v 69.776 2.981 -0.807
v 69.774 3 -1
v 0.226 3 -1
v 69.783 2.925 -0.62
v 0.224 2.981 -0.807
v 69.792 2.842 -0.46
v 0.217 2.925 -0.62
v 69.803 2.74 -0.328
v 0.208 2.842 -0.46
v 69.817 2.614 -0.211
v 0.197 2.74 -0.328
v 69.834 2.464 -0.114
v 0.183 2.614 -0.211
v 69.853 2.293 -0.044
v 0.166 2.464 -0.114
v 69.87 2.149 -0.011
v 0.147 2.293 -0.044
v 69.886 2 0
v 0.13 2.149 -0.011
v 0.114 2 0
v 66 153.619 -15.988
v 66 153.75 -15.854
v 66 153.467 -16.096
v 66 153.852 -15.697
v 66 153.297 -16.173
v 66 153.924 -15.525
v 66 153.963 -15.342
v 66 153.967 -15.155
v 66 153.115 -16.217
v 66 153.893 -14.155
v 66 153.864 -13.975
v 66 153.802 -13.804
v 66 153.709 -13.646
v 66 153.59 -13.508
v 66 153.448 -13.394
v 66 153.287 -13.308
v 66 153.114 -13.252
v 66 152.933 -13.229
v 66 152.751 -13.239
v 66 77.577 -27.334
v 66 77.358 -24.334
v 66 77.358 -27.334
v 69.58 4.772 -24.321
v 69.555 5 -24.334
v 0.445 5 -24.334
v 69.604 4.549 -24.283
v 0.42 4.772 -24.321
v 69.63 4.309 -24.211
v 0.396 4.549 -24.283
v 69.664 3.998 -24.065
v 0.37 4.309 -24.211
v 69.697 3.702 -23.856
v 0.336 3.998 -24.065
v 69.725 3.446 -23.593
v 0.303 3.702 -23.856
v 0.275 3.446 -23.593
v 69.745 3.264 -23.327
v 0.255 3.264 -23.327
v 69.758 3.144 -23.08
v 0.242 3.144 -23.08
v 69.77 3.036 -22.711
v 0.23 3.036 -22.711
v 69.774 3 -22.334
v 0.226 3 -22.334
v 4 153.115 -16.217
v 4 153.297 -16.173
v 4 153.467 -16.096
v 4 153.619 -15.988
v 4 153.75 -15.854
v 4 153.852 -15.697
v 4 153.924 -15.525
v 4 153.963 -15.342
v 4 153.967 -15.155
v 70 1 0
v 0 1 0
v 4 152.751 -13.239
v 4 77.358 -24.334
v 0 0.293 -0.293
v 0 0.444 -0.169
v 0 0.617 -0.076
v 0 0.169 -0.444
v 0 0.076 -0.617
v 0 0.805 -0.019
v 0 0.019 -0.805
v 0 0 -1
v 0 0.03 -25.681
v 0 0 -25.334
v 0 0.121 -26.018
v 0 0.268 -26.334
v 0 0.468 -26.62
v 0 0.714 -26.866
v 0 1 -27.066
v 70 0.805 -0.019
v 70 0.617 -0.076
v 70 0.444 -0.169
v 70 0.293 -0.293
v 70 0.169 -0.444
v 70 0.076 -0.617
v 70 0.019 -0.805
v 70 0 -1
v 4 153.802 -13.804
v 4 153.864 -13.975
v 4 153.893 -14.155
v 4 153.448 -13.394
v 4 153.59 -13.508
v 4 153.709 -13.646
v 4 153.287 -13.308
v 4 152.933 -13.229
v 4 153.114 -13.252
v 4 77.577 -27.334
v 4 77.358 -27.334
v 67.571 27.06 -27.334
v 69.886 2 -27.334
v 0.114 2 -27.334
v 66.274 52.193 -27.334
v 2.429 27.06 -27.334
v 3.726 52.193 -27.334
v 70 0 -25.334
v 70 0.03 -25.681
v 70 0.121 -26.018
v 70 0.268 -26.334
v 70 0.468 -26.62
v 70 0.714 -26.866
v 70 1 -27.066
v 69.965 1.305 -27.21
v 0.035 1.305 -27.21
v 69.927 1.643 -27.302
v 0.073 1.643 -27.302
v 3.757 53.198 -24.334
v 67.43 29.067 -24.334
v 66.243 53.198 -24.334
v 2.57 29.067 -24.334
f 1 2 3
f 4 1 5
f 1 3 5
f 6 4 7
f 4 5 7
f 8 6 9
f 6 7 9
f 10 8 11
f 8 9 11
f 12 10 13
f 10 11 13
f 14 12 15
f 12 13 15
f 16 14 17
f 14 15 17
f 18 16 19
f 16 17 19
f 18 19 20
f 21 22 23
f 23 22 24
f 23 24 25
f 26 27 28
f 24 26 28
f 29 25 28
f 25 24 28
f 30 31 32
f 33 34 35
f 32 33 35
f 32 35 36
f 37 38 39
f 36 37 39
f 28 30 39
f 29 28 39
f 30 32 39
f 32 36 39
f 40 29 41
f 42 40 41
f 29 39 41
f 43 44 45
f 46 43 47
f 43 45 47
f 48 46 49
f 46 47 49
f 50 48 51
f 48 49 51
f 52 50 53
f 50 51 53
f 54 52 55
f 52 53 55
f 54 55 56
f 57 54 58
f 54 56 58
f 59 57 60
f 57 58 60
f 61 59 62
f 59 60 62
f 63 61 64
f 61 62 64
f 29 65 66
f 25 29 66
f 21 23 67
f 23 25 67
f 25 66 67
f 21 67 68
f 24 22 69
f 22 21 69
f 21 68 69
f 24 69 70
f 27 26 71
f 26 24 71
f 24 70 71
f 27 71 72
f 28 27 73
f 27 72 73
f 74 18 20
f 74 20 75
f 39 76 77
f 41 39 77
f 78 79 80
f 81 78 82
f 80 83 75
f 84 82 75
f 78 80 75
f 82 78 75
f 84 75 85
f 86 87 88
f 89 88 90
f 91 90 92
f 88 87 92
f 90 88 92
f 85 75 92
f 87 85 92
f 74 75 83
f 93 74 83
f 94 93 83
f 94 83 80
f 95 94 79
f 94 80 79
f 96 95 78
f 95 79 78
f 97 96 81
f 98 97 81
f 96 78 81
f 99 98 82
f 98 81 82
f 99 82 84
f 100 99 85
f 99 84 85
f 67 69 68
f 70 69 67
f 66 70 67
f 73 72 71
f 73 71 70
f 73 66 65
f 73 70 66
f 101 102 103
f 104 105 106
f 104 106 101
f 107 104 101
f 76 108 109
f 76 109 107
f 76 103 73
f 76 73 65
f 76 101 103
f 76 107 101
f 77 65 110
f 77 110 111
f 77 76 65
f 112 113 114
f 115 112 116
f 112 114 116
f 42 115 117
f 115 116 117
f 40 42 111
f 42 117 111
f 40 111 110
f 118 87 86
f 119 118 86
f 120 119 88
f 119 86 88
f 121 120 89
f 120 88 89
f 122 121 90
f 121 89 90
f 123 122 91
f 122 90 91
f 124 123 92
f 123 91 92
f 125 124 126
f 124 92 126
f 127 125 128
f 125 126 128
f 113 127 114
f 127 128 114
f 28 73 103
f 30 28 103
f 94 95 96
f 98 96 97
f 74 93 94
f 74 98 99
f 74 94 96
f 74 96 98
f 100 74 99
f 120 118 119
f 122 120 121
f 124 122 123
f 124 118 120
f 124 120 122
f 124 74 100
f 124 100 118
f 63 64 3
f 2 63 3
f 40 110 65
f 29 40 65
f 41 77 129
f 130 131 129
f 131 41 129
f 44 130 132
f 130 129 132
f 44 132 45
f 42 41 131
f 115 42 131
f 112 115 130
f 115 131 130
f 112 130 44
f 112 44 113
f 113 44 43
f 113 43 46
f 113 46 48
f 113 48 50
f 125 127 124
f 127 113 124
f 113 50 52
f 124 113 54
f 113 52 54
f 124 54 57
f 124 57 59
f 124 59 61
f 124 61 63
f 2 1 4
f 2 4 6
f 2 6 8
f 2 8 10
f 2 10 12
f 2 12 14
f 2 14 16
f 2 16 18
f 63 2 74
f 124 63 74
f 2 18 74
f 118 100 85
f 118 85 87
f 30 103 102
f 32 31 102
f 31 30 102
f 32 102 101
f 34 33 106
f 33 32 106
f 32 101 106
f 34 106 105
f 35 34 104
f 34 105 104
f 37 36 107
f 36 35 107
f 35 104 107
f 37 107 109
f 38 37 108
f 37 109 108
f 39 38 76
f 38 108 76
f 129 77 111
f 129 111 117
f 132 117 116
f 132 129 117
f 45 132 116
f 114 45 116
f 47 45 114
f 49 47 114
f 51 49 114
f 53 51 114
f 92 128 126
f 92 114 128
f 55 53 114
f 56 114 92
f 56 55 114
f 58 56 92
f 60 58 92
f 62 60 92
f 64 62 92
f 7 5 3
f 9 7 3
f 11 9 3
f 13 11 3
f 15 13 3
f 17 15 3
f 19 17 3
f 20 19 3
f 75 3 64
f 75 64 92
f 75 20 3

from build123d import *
from OCP.BRepAlgoAPI import BRepAlgoAPI_Cut
from OCP.TopTools import TopTools_ListOfShape

# Parameters (mm, degrees)
BOSS_EXTRUDE1_DEPTH = 70
CUT_EXTRUDE4_DEPTH  = 70


with BuildPart() as part:
    # Sketch1 → Boss-Extrude1 (new body)
    with BuildSketch(Plane(origin=(0, 0, 0), x_dir=(0, 0, -1), z_dir=(1, 0, 0))):
        with BuildLine():
            Line((1, 0), (25.334184189, 0))
            ThreePointArc((25.334184189, 0), (26.748397751, 0.585786438), (27.334184189, 2))
            Line((27.334184189, 2), (27.334184189, 77.577100538))
            Line((27.334184189, 77.577100538), (16.217438852, 153.114908847))
            ThreePointArc((16.217438852, 153.114908847), (15.853623852, 153.749510415), (15.155100701, 153.966641506))
            Line((15.155100701, 153.966641506), (14.155100701, 153.893451695))
            ThreePointArc((14.155100701, 153.893451695), (13.447894018, 153.521647944), (13.238751678, 152.750519677))
            Line((13.238751678, 152.750519677), (24.334184189, 77.357531107))
            Line((24.334184189, 77.357531107), (24.334184189, 5))
            ThreePointArc((24.334184189, 5), (23.748397751, 3.585786438), (22.334184189, 3))
            Line((22.334184189, 3), (1, 3))
            ThreePointArc((1, 3), (0.292893219, 2.707106781), (0, 2))
            Line((0, 2), (0, 1))
            ThreePointArc((0, 1), (0.292893219, 0.292893219), (1, 0))
        make_face()
    extrude(amount=BOSS_EXTRUDE1_DEPTH)


with BuildPart() as cut_extrude4_tool:
    # Sketch2 → Cut-Extrude4 (new body)
    with BuildSketch(Plane.XY):
        with BuildLine():
            Line((0, 1), (0, 154.250011553))
            Line((0, 154.250011553), (4, 154.250011553))
            Line((4, 154.250011553), (4, 77.357531107))
            add(Edge.make_bspline(
                [(4, 77.357531107), (4.361118304, 39.105803732), (0, 1)],
                knots=[0, 0, 0, 1, 1, 1], degree=2))
        make_face()
        with BuildLine():
            Line((70, 154.250011553), (66, 154.250011553))
            Line((66, 154.250011553), (66, 77.357531107))
            add(Edge.make_bspline(
                [(66, 77.357531107), (65.638881696, 39.105803732), (70, 1)],
                knots=[0, 0, 0, 1, 1, 1], degree=2))
            Line((70, 1), (70, 154.250011553))
        make_face()
    extrude(amount=-CUT_EXTRUDE4_DEPTH)


with BuildPart() as part_1:
    add(part.part)

    # Cut-Extrude4: cut by cut_extrude4_tool, with a tolerance
    cut_extrude4_stock = TopTools_ListOfShape()
    cut_extrude4_stock.Append(part_1.part.wrapped)
    cut_extrude4_tools = TopTools_ListOfShape()
    cut_extrude4_tools.Append(cut_extrude4_tool.part.wrapped)
    cut_extrude4_cut = BRepAlgoAPI_Cut()
    cut_extrude4_cut.SetArguments(cut_extrude4_stock)
    cut_extrude4_cut.SetTools(cut_extrude4_tools)
    cut_extrude4_cut.SetFuzzyValue(0.00001)
    cut_extrude4_cut.Build()
    add(Compound.cast(cut_extrude4_cut.Shape()).solids(), mode=Mode.REPLACE)


solid = part_1.part
